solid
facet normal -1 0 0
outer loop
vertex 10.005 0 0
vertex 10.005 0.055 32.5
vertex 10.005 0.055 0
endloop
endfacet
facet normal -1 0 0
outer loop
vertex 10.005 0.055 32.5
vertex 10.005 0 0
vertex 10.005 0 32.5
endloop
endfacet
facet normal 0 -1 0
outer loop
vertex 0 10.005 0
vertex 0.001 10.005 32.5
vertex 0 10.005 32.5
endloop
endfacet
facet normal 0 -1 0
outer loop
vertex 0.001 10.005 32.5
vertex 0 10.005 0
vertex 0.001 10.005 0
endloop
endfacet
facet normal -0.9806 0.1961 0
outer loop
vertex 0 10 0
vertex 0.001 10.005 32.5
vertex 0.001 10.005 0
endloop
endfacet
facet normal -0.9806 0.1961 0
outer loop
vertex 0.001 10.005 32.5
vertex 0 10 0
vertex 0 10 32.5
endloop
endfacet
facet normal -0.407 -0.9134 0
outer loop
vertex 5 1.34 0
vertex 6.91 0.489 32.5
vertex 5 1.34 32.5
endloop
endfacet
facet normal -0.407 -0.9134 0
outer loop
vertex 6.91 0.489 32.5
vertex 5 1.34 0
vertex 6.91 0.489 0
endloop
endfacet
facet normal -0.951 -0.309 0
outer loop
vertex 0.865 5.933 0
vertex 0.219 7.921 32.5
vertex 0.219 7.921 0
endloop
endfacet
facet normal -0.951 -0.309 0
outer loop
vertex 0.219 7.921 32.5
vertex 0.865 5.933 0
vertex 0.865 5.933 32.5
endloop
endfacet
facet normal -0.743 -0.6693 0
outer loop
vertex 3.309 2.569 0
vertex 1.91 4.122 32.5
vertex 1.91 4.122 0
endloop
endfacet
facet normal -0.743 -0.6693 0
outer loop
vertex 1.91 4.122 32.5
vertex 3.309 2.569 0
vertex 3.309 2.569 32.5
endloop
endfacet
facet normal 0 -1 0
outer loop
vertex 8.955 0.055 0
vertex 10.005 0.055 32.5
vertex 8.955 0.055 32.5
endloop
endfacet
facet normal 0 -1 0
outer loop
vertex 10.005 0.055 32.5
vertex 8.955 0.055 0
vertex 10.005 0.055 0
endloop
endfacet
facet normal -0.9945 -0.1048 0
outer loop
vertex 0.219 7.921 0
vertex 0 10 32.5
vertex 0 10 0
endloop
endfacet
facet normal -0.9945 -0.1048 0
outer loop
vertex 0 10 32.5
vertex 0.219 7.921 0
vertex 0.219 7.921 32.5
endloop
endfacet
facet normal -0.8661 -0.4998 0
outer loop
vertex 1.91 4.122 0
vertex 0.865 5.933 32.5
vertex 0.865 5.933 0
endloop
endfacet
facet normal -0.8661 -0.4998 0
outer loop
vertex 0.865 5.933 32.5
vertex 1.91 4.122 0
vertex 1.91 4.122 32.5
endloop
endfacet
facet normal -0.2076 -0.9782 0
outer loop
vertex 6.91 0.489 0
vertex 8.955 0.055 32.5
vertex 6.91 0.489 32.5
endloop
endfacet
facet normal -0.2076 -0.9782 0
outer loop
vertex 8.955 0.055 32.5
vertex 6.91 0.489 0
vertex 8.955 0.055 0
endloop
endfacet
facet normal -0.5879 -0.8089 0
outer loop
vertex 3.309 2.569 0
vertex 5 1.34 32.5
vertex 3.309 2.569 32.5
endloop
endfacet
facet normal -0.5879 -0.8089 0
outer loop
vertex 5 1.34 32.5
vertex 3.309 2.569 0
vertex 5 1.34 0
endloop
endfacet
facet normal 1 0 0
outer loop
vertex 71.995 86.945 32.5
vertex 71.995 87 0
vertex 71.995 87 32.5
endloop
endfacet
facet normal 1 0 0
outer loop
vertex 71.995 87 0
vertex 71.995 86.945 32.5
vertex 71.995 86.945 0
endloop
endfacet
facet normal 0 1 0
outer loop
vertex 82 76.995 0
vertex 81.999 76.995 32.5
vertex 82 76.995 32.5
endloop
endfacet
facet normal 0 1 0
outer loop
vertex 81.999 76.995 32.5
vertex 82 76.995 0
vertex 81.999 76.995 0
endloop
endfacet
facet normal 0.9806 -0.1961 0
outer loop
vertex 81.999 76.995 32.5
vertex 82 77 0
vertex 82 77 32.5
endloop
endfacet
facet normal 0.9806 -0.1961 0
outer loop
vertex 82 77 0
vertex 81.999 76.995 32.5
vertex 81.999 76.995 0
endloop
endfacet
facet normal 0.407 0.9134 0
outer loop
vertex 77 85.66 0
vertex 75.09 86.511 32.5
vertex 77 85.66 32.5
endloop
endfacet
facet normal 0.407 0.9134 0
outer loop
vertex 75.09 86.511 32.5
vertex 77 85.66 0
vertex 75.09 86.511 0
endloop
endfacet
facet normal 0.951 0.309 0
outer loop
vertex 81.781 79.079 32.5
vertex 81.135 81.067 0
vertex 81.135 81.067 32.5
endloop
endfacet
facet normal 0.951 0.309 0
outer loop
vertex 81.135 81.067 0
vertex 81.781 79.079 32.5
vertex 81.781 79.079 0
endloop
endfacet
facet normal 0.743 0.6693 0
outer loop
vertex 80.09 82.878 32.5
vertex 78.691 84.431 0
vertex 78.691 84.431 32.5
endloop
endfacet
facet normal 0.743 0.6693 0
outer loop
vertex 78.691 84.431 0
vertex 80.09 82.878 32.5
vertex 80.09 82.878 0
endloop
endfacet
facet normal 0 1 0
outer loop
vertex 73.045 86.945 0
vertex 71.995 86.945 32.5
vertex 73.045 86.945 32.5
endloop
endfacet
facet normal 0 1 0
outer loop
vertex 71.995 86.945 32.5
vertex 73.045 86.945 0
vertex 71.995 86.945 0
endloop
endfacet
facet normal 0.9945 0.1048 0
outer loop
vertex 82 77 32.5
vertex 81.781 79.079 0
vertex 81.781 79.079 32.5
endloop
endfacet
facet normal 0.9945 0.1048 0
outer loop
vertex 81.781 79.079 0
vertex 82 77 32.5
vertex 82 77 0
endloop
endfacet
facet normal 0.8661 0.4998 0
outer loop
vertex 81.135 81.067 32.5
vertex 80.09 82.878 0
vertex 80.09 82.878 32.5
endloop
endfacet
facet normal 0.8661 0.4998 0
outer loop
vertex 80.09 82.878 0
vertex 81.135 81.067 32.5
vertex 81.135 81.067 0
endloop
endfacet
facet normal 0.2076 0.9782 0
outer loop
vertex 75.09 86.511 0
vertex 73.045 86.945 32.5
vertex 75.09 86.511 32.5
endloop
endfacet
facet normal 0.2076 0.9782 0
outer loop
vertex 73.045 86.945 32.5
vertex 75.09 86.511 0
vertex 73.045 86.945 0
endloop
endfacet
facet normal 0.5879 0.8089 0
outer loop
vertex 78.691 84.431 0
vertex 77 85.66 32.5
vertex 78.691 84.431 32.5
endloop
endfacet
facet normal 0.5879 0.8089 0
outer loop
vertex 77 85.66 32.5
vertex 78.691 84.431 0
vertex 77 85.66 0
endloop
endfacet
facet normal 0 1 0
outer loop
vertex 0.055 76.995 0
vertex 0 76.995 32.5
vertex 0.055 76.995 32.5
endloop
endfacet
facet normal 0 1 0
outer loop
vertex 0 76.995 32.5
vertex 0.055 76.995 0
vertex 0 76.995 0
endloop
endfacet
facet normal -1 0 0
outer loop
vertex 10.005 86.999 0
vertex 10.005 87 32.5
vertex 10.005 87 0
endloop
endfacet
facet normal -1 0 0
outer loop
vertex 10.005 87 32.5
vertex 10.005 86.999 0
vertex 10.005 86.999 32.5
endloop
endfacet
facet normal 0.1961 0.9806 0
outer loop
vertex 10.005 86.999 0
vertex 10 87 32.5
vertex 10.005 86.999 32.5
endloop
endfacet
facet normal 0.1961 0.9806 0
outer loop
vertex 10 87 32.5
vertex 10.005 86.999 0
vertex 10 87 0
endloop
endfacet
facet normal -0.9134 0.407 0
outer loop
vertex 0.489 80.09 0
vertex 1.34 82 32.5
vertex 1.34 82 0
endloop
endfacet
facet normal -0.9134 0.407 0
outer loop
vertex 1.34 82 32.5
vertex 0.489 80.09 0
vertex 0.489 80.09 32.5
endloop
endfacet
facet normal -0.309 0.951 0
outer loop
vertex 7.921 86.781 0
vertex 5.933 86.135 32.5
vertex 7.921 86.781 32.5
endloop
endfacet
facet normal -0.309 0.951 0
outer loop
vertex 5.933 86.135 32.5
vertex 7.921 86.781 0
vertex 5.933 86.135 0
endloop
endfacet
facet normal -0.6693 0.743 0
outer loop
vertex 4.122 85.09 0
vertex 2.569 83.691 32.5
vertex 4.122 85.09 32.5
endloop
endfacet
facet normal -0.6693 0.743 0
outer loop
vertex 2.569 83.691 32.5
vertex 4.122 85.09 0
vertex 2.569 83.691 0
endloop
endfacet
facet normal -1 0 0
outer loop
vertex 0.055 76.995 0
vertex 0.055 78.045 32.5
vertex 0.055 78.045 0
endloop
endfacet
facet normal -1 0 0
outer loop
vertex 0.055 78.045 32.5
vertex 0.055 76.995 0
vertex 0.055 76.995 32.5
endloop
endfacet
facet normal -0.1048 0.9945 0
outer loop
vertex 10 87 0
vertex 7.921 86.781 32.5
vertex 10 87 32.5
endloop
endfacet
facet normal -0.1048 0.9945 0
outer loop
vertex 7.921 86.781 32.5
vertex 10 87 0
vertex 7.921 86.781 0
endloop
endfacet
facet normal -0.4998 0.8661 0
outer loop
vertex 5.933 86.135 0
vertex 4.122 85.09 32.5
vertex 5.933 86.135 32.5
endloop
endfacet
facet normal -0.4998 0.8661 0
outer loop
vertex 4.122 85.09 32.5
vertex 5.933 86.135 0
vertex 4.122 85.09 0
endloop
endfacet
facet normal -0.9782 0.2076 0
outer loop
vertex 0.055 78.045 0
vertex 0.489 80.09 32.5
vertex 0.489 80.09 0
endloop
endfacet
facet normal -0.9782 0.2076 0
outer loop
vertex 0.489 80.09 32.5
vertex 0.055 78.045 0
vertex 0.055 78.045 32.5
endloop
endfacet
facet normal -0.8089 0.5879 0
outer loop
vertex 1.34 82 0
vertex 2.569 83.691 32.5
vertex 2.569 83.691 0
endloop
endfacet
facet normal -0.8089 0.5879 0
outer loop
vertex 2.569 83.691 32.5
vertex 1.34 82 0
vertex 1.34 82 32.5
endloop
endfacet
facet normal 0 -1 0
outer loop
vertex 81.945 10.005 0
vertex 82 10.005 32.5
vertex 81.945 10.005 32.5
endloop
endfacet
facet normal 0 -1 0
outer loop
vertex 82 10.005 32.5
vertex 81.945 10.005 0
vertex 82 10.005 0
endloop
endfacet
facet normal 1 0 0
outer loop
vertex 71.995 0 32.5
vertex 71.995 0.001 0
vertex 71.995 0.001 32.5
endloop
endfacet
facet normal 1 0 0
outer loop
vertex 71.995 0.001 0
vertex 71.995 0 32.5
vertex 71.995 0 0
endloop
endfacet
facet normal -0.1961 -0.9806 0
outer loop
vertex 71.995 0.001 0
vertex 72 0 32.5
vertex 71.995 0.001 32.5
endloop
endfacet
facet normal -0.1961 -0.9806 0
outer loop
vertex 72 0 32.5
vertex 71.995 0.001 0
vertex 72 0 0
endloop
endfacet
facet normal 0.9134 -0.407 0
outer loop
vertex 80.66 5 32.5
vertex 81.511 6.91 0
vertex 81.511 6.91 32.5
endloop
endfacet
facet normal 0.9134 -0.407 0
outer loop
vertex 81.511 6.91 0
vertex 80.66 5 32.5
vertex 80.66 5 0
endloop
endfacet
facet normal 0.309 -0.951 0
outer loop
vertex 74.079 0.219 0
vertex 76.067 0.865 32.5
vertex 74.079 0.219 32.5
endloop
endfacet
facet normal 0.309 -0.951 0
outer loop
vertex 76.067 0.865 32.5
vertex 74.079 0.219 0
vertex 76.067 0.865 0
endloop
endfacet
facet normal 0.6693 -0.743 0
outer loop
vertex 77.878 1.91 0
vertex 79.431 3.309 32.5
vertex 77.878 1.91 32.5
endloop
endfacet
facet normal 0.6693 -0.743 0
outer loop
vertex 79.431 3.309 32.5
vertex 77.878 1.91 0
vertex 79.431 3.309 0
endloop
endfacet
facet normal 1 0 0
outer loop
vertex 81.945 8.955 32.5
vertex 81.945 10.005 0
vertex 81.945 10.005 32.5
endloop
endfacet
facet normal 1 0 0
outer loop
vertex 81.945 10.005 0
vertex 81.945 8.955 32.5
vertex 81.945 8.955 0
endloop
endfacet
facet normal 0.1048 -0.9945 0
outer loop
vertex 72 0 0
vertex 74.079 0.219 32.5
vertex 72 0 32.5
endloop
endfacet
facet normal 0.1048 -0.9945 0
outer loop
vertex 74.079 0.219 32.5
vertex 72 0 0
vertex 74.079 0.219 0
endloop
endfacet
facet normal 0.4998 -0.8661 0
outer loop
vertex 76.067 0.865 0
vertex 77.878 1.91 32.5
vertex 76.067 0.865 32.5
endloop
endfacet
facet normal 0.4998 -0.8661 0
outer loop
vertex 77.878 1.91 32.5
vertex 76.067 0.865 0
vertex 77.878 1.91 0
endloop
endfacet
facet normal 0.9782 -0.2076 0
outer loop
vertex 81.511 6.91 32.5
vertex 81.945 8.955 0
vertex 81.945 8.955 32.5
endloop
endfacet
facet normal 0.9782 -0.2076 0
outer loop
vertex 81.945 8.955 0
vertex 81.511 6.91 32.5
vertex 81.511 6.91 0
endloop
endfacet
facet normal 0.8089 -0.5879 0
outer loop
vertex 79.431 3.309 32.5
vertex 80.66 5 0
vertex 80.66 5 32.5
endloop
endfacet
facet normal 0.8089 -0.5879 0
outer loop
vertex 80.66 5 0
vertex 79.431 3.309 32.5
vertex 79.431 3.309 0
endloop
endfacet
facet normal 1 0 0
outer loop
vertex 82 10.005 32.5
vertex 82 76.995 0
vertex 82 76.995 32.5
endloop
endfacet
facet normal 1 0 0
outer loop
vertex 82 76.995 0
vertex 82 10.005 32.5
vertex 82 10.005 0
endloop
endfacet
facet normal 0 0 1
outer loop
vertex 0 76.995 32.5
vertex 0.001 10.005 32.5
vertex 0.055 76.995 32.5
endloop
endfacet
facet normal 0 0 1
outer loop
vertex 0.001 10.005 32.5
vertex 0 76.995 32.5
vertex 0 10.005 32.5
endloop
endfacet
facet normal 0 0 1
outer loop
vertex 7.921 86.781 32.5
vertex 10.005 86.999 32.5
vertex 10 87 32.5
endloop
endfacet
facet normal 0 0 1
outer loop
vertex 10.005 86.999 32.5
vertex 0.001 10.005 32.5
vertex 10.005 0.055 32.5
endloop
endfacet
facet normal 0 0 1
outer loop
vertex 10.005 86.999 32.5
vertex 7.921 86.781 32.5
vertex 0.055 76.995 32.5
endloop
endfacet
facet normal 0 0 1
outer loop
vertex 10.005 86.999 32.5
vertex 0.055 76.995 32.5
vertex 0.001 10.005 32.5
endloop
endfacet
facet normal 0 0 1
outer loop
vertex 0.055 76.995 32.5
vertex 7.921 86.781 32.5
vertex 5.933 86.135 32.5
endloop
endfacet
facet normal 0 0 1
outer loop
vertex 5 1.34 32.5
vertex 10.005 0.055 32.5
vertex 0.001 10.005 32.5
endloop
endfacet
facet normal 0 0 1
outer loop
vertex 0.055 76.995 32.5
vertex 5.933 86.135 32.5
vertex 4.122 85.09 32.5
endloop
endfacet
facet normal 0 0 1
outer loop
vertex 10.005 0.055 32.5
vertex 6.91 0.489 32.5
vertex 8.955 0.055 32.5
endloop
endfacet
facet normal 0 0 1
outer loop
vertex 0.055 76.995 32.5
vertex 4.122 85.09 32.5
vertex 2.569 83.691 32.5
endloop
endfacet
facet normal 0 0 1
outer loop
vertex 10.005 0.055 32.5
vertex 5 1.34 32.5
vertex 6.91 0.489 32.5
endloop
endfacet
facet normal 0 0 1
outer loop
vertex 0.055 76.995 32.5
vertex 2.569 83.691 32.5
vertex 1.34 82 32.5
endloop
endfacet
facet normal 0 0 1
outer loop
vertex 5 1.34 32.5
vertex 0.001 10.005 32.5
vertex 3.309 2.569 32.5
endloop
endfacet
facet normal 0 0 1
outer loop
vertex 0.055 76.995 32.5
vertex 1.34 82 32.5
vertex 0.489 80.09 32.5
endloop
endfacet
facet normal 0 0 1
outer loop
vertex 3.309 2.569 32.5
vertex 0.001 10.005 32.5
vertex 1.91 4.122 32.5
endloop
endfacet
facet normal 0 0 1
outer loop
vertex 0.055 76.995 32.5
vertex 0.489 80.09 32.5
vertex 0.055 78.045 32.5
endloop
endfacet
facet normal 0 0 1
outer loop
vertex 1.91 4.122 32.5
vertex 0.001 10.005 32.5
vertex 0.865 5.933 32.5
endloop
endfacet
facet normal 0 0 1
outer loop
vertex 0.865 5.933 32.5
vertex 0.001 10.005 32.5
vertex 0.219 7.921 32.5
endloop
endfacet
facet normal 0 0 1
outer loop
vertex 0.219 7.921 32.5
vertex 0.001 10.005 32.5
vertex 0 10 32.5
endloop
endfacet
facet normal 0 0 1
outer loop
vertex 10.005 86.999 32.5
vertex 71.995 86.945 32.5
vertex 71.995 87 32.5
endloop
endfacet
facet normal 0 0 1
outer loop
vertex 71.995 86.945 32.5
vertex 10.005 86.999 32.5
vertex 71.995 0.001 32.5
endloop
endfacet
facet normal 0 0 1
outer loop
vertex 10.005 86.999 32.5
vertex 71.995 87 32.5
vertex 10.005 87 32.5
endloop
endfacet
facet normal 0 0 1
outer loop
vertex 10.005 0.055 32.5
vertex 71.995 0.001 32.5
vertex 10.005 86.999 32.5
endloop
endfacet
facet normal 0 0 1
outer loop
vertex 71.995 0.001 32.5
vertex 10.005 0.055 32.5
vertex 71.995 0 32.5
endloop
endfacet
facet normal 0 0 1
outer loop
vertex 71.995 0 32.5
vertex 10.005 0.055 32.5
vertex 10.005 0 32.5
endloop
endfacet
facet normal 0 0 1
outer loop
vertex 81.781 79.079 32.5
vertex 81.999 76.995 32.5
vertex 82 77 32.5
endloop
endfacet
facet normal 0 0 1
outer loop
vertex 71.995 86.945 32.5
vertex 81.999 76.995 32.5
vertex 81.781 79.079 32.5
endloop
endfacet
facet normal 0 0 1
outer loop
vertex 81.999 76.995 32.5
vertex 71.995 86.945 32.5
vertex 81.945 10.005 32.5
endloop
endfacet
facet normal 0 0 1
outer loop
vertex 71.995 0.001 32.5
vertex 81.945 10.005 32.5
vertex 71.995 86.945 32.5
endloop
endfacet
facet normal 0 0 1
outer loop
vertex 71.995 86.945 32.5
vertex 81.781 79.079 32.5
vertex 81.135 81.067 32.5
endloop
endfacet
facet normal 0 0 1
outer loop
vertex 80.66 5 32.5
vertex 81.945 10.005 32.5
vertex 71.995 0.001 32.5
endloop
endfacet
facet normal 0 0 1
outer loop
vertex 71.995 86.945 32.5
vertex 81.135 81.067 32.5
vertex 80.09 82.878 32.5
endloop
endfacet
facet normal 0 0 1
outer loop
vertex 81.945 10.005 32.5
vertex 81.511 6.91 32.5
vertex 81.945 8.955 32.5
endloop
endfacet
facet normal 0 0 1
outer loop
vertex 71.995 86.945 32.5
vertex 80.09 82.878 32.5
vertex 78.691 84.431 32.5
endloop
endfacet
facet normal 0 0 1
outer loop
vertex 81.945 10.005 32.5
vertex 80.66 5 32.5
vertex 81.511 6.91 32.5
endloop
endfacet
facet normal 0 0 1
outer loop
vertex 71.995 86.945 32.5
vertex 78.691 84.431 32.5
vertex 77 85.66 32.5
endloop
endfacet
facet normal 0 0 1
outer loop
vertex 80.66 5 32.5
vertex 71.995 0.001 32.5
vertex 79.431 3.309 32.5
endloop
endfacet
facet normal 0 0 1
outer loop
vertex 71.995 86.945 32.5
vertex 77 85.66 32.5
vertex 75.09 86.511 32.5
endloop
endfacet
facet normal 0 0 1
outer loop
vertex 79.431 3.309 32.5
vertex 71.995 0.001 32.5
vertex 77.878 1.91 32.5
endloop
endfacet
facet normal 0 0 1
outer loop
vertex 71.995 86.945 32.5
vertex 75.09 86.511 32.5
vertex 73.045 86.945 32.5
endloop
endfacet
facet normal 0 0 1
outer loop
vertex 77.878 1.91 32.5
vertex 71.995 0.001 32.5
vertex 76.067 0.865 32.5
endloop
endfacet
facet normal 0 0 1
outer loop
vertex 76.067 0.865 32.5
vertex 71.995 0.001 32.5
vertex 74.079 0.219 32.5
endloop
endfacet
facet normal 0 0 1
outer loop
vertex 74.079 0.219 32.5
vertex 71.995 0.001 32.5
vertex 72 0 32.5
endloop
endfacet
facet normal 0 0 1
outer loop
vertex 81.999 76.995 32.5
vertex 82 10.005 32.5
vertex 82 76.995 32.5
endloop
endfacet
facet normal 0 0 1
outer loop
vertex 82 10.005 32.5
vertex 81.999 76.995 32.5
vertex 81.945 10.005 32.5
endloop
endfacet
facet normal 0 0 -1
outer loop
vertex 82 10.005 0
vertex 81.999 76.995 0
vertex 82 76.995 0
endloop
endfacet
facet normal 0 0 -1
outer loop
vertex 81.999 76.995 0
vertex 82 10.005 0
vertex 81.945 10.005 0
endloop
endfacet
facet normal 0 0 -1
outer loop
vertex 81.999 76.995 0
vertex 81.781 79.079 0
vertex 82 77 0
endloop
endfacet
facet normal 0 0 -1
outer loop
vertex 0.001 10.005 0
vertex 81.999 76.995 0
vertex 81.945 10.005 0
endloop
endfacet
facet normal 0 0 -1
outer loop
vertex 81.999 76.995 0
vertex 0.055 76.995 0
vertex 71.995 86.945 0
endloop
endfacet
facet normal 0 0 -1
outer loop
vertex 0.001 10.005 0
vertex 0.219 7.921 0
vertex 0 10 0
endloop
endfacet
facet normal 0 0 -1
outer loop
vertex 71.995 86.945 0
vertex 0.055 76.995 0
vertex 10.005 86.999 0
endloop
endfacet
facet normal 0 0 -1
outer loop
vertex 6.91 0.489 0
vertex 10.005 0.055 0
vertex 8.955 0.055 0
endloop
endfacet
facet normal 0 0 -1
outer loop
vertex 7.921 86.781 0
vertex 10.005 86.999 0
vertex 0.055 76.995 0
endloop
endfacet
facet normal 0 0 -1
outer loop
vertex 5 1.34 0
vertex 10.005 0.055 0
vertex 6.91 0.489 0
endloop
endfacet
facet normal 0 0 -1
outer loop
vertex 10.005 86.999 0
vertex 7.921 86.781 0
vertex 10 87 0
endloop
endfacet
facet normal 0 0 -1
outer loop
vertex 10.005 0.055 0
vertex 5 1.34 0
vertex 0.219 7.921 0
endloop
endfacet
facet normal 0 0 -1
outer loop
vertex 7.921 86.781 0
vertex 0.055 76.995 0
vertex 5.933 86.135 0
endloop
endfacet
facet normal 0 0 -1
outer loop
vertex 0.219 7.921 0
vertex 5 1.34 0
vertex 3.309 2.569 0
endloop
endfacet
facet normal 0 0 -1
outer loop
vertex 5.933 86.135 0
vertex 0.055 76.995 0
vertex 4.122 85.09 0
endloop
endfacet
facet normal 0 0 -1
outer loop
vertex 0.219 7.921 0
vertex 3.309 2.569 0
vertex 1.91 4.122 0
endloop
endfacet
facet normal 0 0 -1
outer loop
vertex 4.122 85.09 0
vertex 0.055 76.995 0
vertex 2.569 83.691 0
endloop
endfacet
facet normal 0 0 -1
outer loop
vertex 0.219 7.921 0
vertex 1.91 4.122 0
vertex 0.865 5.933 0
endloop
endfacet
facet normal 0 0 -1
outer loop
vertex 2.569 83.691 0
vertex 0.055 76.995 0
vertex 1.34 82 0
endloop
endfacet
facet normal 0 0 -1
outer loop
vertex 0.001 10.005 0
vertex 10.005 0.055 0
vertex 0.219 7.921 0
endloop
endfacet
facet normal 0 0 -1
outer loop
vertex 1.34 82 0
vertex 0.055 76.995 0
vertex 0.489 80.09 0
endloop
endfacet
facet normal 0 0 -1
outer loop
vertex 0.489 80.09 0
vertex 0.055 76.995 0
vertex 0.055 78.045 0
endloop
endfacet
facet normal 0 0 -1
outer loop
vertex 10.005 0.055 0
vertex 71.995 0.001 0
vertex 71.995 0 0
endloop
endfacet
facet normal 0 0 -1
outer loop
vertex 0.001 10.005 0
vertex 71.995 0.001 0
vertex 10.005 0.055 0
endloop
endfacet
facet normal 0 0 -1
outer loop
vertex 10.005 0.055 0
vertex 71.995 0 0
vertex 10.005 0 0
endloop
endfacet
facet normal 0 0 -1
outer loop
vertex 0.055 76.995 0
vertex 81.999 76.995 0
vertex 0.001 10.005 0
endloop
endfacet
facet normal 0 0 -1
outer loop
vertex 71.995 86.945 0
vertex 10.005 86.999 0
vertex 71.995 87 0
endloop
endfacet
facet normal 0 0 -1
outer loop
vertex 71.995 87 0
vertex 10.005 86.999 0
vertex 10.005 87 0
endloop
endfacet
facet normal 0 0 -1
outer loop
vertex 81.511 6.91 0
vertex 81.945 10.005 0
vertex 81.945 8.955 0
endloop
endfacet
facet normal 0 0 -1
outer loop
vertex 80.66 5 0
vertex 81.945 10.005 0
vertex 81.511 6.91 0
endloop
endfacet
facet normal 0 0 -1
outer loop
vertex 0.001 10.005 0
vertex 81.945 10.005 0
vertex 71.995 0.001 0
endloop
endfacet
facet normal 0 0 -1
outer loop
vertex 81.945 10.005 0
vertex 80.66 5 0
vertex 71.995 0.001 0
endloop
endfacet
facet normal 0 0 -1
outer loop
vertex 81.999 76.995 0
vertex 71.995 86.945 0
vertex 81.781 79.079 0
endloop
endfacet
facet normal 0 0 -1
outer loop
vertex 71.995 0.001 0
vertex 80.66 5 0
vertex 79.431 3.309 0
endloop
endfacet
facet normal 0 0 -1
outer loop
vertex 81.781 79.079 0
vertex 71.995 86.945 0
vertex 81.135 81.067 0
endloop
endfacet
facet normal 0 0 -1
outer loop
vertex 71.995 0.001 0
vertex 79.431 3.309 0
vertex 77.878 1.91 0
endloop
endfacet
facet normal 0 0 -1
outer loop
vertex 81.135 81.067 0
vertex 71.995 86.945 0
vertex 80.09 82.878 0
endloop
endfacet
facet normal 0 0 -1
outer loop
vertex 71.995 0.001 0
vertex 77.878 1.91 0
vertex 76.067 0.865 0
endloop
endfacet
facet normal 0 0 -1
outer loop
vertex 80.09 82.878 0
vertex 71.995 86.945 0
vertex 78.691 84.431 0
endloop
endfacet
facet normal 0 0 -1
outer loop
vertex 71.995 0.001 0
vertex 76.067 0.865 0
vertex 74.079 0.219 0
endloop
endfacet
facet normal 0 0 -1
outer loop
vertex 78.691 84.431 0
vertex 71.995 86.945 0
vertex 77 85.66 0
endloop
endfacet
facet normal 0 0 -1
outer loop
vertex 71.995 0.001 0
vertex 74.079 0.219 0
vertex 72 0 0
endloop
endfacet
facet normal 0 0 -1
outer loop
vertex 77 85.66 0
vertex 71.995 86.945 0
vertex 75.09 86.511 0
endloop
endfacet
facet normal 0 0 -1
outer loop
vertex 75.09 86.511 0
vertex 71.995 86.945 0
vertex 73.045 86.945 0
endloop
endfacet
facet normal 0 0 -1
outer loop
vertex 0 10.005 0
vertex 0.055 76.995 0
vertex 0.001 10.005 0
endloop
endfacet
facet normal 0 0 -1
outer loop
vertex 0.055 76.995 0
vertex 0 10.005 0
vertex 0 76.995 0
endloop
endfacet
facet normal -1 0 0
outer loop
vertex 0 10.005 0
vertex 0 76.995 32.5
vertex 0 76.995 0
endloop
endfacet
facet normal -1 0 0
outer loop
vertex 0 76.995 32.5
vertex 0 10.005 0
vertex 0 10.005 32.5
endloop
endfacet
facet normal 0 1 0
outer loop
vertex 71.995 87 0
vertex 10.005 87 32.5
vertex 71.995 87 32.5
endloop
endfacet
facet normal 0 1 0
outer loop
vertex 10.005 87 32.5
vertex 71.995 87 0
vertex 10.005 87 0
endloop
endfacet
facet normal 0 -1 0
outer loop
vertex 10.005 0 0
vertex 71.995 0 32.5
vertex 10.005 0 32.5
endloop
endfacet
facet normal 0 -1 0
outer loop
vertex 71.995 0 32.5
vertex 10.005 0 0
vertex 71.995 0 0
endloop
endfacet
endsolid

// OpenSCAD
DeckSize=[135,160,50];
T=2;
block=[82,87,67];
PegD=5;
golden_ratio=0.618;

module internalHolder(){
union(){
	translate([DeckSize[0]+T,DeckSize[1]+T,0])translate([0,0,DeckSize[2]/4+T/2])rotate([0,0,180])fillet(10,DeckSize[2]/2-T);
	translate([0,DeckSize[1]+T,0])translate([T,0,DeckSize[2]/4+T/2])rotate([0,0,270])fillet(10,DeckSize[2]/2-T);
	translate([DeckSize[0]+T,0,0])translate([0,T,DeckSize[2]/4+T/2])rotate([0,0,90])fillet(10,DeckSize[2]/2-T);
	translate([T,T,DeckSize[2]/4+T/2])fillet(10,DeckSize[2]/2-T);
	cube([DeckSize[0]+T,T,DeckSize[2]/2+T]);
	cube([T,DeckSize[1]+T,DeckSize[2]/2+T]);
	translate([0,DeckSize[1]+T,0])cube([DeckSize[0]+T,T,DeckSize[2]/2+T]);
	translate([DeckSize[0]+T,0,0])cube([T,DeckSize[1]+T*2,DeckSize[2]/2+T]);}
};

module fillet(r, h) {
    translate([r / 2, r / 2, 0])

        difference() {
            cube([r + 0.01, r + 0.01, h], center = true);

            translate([r/2, r/2, 0])
                cylinder(r = r, h = h + 1, center = true);

        }
}

module blockT(){
	difference(){
		cube([block[0],block[1],block[2]/2-1]);
		union(){
			translate([block[0],block[1],0])rotate([0,0,180])fillet(10,block[2]);
			translate([0,block[1],0])rotate([0,0,270])fillet(10,block[2]);
			translate([block[0],0,0])rotate([0,0,90])fillet(10,block[2]);
			fillet(10,block[2]);
		}
	}
}

module base(){
	difference(){
		cube([DeckSize[0],DeckSize[1],T]);
		translate([(DeckSize[0]/2)-block[0]/2,(DeckSize[1]/2)-block[1]/2,-T])blockT();
	}
}

// internalHolder();
// translate([T,T,0])base();

blockT();
